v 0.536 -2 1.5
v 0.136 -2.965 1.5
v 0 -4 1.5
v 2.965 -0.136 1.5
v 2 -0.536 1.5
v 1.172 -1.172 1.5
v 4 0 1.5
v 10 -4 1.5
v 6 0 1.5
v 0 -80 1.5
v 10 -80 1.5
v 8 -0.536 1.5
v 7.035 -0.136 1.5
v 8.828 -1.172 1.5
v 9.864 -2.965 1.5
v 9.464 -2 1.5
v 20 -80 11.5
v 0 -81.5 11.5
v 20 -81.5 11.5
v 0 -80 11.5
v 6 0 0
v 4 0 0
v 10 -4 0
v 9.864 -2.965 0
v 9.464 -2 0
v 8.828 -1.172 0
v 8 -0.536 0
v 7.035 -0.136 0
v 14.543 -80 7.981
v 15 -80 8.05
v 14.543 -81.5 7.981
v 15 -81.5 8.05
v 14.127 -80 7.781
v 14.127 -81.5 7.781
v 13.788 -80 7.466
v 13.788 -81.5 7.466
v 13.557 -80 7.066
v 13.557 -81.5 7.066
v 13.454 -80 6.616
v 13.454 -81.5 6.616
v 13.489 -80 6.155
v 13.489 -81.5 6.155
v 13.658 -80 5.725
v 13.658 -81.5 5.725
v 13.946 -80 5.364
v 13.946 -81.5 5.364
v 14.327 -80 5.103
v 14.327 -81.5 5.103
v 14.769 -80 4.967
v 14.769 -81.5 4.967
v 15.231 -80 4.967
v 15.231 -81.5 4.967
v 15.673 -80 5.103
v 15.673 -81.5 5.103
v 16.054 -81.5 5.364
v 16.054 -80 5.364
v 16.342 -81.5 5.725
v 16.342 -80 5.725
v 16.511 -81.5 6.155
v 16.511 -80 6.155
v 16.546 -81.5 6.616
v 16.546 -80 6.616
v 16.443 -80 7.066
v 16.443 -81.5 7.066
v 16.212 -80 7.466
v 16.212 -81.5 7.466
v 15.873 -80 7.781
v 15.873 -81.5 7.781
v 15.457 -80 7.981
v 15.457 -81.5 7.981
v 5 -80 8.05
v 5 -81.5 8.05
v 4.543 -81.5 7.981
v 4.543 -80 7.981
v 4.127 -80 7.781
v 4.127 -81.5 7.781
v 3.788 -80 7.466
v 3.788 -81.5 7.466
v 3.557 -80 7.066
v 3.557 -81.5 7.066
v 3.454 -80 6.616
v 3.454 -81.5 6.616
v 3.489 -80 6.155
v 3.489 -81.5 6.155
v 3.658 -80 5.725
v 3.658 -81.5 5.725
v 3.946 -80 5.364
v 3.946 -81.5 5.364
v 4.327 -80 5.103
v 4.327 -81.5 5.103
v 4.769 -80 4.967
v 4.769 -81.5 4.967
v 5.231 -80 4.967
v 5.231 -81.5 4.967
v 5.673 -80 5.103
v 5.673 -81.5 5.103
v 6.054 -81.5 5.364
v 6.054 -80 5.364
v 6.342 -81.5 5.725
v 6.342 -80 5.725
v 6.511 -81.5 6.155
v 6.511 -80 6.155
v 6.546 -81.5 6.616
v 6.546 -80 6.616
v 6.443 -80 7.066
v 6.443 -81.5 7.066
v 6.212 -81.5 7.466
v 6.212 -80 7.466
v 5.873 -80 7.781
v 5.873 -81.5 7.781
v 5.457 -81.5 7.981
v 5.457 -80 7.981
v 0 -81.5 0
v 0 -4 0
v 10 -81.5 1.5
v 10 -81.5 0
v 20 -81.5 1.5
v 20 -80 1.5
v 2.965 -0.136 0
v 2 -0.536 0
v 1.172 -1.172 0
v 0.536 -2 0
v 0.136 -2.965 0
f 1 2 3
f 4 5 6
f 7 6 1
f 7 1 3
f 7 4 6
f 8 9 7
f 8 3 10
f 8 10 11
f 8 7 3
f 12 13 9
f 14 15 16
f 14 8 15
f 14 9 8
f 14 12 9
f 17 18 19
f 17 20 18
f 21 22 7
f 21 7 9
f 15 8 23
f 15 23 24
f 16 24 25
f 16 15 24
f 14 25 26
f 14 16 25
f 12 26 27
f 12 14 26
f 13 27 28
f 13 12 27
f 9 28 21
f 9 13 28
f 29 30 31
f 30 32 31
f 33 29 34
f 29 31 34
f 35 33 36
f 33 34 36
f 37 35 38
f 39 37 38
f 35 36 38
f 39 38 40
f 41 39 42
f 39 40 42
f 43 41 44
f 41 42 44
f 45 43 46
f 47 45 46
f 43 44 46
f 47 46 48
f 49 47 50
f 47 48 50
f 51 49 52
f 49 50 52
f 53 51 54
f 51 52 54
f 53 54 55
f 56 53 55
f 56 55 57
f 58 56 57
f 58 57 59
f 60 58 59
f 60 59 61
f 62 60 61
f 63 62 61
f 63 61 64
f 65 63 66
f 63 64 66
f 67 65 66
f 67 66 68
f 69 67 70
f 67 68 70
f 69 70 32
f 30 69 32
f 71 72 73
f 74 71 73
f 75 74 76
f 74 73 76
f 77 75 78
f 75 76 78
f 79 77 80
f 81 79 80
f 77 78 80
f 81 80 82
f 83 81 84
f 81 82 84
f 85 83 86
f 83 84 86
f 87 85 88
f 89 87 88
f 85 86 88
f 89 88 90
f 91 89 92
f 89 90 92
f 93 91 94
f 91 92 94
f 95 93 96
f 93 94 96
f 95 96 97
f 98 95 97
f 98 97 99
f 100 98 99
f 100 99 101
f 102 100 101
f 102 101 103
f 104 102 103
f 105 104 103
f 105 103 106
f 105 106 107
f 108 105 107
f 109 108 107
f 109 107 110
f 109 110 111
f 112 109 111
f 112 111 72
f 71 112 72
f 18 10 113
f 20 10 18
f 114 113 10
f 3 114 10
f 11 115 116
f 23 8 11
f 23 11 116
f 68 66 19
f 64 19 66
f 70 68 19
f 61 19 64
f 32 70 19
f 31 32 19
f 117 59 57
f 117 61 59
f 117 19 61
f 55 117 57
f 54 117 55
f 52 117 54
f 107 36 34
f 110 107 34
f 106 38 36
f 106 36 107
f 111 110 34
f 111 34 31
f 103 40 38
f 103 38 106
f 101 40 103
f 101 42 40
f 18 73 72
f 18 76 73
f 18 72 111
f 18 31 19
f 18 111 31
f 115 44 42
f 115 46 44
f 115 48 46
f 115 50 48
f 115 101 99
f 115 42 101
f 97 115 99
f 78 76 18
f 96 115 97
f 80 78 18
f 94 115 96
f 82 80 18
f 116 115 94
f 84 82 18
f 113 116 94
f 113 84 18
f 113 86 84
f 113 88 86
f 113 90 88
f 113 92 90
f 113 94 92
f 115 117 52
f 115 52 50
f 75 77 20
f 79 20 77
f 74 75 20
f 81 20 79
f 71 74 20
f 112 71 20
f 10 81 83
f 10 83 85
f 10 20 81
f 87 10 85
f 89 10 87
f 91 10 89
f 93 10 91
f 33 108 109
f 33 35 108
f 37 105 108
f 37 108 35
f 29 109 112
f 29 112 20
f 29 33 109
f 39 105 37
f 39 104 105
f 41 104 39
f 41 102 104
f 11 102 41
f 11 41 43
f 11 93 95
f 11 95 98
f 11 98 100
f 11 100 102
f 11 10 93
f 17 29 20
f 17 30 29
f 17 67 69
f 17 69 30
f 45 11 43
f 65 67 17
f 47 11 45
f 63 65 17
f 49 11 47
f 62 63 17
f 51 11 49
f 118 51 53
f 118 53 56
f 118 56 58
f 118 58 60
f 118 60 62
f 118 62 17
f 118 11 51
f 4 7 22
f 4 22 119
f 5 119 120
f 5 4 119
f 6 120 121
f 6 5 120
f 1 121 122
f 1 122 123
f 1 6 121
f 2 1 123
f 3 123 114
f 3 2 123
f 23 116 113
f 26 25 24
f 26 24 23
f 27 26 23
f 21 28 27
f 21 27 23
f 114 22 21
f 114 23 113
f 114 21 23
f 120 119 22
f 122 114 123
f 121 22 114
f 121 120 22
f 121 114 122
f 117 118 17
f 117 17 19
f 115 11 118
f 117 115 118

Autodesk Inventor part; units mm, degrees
ref_plane "YZ Plane" through (0, 0, 0) normal (1, 0, 0) x (0, 1, 0)
ref_plane "XZ Plane" through (0, 0, 0) normal (0, 1, 0) x (-1, 0, 0)
ref_plane "XY Plane" through (0, 0, 0) normal (0, 0, 1) x (1, 0, 0)
sketch "スケッチ1" plane through (0, 0, 0) normal (0, 0, 1) x (1, 0, 0)
  line L0 (0, 0) -> (10, 0)
  line L1 (10, 0) -> (10, -80)
  line L2 (10, -80) -> (0, -80)
  line L3 (0, -80) -> (0, 0)
  dimension "d0" = 10
  dimension "d1" = 80
extrude "押し出し1" add sketch "スケッチ1" along normal blind 1.5
fillet "フィレット1" radius 4 2 edges at (10, 0, 0.75) (0, 0, 0.75)
sketch "スケッチ2" plane through (0, -80, 0) normal (0, -1, 0) x (1, 0, 0)
  line L0 (0, 1.5) -> (10, 1.5)
  line L1 (10, 1.5) -> (10, 0)
  line L2 (10, 0) -> (0, 0)
  line L3 (0, 0) -> (0, 1.5)
extrude "押し出し2" add sketch "スケッチ2" along normal blind 1.5
sketch "スケッチ4" plane through (0, 0, 1.5) normal (0, 0, 1) x (1, 0, 0)
  line L0 (20, -81.5) -> (-10, -81.5)
  line L1 (-10, -81.5) -> (-10, -80)
  line L2 (-10, -80) -> (20, -80)
  line L3 (20, -80) -> (20, -81.5)
  point P0 (0, 0)
  dimension "d10" = 30
  dimension "d11" = 1.5
extrude "押し出し4" add sketch "スケッチ4" along normal blind 10
sketch "スケッチ6" plane through (-10, -80, 1.5) normal (0, 1, 0) x (1, 0, 0)
  line L0 (0, -10) -> (10, -10)
  line L1 (10, -10) -> (10, 0)
  line L2 (10, 0) -> (0, 0)
  line L3 (0, 0) -> (0, -10)
  point P0 (10, 1.5)
extrude "押し出し6" cut sketch "スケッチ6" against normal blind 10
sketch "スケッチ8" plane through (10, -80, 1.5) normal (0, 1, 0) x (1, 0, 0)
  line L0 (10, 0) -> (10, -10) projected
  line L1 (10, -10) -> (-10, -10) projected
  point P0 (-10, 1.5)
  point P1 (-5, -5)
  point P2 (5, -5)
  dimension "d25" = 5
  dimension "d26" = 5
  dimension "d27" = 10
hole "穴1" at (5, -80, 6.5) at (15, -80, 6.5) direction (0, -1, 0) diameter 3.1 depth 8 tip angle 118
properties part number "Fork 1 left ver2" material "アルミニウム 5052 H32"
